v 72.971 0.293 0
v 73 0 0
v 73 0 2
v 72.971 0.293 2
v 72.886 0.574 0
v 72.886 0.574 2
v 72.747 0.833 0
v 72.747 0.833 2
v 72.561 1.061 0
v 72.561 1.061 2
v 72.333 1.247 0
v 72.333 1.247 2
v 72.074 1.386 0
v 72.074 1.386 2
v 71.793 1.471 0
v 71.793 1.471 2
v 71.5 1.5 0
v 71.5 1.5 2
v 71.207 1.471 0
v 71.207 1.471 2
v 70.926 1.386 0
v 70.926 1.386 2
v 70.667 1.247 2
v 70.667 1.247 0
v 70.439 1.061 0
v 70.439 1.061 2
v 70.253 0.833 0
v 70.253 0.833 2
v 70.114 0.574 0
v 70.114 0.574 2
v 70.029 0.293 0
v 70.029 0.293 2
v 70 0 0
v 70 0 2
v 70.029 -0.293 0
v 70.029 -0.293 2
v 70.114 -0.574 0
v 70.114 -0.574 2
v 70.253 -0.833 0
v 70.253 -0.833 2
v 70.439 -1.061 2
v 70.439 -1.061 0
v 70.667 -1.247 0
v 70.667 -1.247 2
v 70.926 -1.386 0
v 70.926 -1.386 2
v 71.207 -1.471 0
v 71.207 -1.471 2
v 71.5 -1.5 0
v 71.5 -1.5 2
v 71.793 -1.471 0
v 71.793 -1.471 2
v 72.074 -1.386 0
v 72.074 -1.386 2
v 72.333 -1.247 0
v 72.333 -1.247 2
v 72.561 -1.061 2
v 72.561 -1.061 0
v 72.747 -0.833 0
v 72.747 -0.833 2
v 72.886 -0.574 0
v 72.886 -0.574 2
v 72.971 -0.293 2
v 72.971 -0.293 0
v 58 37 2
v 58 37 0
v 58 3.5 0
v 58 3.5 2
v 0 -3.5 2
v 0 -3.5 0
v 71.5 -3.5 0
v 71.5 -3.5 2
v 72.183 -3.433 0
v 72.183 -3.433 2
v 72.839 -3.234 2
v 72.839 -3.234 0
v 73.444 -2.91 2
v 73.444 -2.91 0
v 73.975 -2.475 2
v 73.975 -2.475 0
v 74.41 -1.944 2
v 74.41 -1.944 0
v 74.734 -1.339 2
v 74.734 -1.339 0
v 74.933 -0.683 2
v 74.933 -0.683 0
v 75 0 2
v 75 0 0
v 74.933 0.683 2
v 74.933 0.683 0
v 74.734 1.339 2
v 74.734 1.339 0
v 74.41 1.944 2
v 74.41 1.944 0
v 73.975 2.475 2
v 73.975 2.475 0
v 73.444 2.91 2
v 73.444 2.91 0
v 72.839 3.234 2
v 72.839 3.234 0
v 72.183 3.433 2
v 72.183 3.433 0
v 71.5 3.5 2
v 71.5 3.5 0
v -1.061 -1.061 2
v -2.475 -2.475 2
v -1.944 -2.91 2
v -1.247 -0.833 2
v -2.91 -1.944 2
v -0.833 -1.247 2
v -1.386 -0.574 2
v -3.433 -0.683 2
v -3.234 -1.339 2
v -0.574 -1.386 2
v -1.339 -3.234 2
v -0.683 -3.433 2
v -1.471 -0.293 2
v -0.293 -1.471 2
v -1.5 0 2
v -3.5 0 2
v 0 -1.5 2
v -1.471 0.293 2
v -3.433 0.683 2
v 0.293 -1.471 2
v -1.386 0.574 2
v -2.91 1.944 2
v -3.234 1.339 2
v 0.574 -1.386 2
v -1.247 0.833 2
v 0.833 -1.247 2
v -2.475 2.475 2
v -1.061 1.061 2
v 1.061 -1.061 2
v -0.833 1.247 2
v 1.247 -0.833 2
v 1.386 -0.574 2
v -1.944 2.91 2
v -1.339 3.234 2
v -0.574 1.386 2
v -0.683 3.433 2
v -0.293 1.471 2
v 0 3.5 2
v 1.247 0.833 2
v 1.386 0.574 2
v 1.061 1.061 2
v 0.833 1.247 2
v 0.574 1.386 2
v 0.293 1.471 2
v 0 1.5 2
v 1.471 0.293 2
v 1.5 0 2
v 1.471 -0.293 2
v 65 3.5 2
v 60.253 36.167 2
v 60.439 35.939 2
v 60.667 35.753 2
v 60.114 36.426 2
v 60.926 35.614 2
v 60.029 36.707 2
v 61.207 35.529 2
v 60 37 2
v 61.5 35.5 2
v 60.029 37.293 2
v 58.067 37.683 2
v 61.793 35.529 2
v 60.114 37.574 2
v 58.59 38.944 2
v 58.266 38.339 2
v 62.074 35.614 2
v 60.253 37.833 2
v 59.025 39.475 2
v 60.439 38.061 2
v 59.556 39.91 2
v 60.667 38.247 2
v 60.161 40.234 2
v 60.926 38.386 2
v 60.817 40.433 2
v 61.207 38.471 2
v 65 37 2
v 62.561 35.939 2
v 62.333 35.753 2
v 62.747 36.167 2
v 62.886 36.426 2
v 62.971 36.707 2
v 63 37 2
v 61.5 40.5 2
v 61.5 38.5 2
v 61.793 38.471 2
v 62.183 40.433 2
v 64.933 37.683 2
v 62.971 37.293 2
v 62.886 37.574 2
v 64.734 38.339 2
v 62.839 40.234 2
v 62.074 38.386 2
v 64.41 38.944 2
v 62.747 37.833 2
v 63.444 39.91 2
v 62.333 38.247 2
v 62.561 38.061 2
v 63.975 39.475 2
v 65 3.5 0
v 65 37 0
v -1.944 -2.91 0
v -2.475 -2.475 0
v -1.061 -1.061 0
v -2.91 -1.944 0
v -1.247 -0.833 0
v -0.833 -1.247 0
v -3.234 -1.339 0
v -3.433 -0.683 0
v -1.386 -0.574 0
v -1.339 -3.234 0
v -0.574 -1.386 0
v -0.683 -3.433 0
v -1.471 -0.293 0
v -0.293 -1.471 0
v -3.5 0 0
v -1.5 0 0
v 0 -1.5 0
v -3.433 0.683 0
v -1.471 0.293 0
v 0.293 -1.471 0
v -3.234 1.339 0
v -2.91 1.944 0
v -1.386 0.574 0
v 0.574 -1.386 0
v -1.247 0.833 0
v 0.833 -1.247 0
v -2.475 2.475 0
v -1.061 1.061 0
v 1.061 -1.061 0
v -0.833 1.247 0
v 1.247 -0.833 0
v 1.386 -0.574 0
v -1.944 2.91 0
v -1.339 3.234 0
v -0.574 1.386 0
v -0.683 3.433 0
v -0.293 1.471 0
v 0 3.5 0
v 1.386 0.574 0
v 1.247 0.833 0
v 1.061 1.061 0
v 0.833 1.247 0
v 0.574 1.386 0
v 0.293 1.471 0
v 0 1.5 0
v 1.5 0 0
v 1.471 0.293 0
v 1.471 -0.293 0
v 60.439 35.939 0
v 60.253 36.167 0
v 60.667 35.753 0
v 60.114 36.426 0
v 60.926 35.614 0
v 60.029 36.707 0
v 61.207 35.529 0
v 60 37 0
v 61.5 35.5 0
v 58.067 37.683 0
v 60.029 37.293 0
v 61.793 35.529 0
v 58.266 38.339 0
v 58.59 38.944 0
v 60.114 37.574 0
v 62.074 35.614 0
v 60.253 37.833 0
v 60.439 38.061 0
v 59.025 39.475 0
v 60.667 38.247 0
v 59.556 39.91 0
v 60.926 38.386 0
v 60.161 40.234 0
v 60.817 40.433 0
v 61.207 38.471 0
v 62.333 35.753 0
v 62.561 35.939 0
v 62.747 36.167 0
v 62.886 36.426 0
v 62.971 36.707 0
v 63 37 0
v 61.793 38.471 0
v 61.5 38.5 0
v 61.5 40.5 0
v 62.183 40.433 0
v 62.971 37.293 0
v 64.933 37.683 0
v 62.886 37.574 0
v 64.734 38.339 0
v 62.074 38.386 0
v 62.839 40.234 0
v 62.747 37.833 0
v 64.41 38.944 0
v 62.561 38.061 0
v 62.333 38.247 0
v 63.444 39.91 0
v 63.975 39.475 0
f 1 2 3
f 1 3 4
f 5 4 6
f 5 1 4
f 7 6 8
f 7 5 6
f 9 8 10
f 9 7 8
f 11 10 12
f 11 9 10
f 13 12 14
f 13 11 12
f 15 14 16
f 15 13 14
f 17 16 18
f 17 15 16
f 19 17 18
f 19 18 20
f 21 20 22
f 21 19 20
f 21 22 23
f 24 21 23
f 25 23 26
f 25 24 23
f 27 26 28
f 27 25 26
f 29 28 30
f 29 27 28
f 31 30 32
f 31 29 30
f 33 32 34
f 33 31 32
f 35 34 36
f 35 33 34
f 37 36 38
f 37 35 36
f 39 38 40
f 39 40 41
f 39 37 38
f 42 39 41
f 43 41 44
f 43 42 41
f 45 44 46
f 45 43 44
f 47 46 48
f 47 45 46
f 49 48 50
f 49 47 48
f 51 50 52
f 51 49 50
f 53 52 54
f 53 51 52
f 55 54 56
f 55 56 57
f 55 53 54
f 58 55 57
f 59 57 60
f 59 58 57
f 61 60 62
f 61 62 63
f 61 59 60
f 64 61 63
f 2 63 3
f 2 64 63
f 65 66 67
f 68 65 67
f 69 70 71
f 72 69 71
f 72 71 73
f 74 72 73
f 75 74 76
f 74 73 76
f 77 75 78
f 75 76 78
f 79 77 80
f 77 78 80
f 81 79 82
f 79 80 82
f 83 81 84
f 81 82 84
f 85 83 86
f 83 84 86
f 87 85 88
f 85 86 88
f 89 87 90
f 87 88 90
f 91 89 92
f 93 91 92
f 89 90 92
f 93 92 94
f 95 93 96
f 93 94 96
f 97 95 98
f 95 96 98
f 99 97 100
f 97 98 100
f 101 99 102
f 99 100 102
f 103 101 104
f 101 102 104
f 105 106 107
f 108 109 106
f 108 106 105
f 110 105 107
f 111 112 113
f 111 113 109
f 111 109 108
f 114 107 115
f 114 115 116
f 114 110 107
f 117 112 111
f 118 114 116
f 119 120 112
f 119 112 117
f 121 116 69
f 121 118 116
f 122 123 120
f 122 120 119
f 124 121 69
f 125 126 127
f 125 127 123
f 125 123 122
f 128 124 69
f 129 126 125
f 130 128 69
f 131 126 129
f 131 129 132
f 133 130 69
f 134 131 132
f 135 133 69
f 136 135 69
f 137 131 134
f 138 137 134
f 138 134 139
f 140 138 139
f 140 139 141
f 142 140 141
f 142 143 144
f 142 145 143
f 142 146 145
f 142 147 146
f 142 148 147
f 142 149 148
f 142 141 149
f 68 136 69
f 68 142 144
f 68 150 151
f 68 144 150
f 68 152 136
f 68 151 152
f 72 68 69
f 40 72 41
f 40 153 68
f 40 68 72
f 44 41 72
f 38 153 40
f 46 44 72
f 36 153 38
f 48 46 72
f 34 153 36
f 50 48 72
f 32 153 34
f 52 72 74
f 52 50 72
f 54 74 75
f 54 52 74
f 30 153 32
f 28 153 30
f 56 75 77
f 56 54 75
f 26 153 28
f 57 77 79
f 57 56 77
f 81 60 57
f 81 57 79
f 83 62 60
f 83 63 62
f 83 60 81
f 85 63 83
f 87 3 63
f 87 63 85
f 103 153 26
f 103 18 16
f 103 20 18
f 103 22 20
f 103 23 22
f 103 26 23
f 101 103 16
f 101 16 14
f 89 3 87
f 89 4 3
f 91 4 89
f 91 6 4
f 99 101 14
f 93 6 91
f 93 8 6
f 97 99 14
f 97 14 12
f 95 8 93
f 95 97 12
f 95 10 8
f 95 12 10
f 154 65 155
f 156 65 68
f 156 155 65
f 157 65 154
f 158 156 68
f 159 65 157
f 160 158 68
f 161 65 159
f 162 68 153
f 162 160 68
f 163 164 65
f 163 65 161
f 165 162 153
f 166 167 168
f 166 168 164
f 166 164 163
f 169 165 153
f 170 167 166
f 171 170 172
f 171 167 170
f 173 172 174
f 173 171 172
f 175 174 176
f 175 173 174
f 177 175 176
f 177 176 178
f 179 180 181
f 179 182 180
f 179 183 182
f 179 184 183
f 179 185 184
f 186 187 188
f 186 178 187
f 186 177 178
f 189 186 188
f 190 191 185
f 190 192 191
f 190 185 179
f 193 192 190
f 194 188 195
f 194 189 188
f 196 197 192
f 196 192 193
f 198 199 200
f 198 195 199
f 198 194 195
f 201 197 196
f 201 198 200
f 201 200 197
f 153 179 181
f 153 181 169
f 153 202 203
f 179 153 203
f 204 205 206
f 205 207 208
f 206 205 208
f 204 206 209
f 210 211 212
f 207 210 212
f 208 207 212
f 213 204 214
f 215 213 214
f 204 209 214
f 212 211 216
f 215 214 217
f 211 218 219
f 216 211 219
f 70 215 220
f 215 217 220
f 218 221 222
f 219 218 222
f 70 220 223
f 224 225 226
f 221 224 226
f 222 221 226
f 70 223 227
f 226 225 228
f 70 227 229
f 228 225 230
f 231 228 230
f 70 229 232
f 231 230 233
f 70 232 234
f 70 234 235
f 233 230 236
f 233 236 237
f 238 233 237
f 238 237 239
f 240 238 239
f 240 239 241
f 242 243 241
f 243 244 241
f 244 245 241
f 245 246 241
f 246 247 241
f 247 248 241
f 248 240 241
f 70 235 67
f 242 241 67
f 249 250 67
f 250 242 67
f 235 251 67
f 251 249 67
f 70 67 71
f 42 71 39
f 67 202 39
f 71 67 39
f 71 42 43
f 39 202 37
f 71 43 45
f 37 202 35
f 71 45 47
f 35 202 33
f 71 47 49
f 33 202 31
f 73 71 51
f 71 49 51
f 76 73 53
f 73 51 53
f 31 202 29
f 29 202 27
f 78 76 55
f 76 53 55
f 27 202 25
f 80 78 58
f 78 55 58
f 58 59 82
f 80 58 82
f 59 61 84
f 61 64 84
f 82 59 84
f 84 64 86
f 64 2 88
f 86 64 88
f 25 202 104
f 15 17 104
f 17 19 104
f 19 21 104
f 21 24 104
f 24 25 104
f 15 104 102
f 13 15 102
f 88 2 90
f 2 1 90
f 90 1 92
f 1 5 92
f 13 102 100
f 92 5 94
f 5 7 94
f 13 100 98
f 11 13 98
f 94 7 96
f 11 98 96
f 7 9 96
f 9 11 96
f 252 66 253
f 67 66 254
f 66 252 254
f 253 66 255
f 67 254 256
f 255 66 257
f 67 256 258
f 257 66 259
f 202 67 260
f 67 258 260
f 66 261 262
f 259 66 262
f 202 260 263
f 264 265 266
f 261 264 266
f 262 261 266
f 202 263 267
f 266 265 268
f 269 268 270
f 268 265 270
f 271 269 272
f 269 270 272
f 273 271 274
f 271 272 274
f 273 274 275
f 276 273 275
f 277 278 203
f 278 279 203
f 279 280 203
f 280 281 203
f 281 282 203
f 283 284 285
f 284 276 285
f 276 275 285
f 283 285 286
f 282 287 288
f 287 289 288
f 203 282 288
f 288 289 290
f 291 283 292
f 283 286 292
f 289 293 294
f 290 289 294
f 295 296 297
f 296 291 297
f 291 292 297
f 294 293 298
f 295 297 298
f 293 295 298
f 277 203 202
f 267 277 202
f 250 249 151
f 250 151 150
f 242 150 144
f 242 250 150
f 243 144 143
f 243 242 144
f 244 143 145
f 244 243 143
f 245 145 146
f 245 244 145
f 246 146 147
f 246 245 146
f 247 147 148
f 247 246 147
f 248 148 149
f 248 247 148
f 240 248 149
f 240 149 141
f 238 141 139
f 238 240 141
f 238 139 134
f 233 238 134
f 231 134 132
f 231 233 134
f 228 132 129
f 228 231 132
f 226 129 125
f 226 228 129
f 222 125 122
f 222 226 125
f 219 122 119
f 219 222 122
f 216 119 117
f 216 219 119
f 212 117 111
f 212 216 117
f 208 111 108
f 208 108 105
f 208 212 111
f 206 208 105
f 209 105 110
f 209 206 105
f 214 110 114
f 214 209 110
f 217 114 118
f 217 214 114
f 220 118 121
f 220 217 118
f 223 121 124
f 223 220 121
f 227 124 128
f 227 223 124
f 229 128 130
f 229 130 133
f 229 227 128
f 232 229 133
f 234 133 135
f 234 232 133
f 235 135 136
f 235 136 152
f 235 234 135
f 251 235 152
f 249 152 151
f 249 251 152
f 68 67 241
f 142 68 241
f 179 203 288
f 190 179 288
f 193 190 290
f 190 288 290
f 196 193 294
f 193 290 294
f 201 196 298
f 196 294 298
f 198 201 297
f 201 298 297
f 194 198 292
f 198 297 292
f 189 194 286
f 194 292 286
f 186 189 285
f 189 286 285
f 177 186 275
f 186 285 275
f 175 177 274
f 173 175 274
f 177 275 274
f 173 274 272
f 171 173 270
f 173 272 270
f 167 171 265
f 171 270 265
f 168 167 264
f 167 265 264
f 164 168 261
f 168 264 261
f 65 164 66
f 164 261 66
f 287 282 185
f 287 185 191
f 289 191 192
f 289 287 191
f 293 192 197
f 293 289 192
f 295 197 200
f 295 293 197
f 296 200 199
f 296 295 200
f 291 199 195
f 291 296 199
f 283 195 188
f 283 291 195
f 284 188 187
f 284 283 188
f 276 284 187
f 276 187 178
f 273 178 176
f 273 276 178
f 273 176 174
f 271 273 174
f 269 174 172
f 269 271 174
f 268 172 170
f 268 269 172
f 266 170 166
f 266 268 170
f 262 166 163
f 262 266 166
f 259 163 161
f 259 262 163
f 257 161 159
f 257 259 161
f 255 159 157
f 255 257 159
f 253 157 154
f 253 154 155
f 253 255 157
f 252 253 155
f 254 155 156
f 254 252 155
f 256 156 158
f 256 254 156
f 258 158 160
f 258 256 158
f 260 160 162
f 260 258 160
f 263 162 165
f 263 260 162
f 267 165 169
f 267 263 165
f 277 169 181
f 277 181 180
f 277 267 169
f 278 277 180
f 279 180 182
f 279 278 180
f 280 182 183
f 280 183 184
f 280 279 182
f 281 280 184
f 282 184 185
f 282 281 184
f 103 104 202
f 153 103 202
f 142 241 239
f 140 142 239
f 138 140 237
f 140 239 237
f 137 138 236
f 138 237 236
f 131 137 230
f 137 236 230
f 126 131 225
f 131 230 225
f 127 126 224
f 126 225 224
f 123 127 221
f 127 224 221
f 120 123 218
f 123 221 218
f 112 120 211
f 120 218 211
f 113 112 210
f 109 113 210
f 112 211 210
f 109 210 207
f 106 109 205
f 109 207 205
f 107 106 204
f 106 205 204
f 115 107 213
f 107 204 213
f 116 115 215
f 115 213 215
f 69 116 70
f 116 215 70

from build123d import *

# Parameters (mm, degrees)
F0_R     = 1.5
F1_DEPTH = 2


with BuildPart() as f1:
    # F0 (on Top) → F1 (new body)
    with BuildSketch(Plane.XY):
        with BuildLine():
            Line((65, 3.5), (65, 37))
            ThreePointArc((65, 37), (61.5, 40.5), (58, 37))
            Line((58, 37), (58, 3.5))
            Line((58, 3.5), (0, 3.5))
            ThreePointArc((0, 3.5), (-3.5, 0), (0, -3.5))
            Line((0, -3.5), (71.5, -3.5))
            ThreePointArc((71.5, -3.5), (75, 0), (71.5, 3.5))
            Line((71.5, 3.5), (65, 3.5))
        make_face()
        Circle(F0_R, mode=Mode.SUBTRACT)
        with Locations((71.5, 0)):
            Circle(F0_R, mode=Mode.SUBTRACT)
        with Locations((61.5, 37)):
            Circle(F0_R, mode=Mode.SUBTRACT)
    extrude(amount=F1_DEPTH)


solid = f1.part
